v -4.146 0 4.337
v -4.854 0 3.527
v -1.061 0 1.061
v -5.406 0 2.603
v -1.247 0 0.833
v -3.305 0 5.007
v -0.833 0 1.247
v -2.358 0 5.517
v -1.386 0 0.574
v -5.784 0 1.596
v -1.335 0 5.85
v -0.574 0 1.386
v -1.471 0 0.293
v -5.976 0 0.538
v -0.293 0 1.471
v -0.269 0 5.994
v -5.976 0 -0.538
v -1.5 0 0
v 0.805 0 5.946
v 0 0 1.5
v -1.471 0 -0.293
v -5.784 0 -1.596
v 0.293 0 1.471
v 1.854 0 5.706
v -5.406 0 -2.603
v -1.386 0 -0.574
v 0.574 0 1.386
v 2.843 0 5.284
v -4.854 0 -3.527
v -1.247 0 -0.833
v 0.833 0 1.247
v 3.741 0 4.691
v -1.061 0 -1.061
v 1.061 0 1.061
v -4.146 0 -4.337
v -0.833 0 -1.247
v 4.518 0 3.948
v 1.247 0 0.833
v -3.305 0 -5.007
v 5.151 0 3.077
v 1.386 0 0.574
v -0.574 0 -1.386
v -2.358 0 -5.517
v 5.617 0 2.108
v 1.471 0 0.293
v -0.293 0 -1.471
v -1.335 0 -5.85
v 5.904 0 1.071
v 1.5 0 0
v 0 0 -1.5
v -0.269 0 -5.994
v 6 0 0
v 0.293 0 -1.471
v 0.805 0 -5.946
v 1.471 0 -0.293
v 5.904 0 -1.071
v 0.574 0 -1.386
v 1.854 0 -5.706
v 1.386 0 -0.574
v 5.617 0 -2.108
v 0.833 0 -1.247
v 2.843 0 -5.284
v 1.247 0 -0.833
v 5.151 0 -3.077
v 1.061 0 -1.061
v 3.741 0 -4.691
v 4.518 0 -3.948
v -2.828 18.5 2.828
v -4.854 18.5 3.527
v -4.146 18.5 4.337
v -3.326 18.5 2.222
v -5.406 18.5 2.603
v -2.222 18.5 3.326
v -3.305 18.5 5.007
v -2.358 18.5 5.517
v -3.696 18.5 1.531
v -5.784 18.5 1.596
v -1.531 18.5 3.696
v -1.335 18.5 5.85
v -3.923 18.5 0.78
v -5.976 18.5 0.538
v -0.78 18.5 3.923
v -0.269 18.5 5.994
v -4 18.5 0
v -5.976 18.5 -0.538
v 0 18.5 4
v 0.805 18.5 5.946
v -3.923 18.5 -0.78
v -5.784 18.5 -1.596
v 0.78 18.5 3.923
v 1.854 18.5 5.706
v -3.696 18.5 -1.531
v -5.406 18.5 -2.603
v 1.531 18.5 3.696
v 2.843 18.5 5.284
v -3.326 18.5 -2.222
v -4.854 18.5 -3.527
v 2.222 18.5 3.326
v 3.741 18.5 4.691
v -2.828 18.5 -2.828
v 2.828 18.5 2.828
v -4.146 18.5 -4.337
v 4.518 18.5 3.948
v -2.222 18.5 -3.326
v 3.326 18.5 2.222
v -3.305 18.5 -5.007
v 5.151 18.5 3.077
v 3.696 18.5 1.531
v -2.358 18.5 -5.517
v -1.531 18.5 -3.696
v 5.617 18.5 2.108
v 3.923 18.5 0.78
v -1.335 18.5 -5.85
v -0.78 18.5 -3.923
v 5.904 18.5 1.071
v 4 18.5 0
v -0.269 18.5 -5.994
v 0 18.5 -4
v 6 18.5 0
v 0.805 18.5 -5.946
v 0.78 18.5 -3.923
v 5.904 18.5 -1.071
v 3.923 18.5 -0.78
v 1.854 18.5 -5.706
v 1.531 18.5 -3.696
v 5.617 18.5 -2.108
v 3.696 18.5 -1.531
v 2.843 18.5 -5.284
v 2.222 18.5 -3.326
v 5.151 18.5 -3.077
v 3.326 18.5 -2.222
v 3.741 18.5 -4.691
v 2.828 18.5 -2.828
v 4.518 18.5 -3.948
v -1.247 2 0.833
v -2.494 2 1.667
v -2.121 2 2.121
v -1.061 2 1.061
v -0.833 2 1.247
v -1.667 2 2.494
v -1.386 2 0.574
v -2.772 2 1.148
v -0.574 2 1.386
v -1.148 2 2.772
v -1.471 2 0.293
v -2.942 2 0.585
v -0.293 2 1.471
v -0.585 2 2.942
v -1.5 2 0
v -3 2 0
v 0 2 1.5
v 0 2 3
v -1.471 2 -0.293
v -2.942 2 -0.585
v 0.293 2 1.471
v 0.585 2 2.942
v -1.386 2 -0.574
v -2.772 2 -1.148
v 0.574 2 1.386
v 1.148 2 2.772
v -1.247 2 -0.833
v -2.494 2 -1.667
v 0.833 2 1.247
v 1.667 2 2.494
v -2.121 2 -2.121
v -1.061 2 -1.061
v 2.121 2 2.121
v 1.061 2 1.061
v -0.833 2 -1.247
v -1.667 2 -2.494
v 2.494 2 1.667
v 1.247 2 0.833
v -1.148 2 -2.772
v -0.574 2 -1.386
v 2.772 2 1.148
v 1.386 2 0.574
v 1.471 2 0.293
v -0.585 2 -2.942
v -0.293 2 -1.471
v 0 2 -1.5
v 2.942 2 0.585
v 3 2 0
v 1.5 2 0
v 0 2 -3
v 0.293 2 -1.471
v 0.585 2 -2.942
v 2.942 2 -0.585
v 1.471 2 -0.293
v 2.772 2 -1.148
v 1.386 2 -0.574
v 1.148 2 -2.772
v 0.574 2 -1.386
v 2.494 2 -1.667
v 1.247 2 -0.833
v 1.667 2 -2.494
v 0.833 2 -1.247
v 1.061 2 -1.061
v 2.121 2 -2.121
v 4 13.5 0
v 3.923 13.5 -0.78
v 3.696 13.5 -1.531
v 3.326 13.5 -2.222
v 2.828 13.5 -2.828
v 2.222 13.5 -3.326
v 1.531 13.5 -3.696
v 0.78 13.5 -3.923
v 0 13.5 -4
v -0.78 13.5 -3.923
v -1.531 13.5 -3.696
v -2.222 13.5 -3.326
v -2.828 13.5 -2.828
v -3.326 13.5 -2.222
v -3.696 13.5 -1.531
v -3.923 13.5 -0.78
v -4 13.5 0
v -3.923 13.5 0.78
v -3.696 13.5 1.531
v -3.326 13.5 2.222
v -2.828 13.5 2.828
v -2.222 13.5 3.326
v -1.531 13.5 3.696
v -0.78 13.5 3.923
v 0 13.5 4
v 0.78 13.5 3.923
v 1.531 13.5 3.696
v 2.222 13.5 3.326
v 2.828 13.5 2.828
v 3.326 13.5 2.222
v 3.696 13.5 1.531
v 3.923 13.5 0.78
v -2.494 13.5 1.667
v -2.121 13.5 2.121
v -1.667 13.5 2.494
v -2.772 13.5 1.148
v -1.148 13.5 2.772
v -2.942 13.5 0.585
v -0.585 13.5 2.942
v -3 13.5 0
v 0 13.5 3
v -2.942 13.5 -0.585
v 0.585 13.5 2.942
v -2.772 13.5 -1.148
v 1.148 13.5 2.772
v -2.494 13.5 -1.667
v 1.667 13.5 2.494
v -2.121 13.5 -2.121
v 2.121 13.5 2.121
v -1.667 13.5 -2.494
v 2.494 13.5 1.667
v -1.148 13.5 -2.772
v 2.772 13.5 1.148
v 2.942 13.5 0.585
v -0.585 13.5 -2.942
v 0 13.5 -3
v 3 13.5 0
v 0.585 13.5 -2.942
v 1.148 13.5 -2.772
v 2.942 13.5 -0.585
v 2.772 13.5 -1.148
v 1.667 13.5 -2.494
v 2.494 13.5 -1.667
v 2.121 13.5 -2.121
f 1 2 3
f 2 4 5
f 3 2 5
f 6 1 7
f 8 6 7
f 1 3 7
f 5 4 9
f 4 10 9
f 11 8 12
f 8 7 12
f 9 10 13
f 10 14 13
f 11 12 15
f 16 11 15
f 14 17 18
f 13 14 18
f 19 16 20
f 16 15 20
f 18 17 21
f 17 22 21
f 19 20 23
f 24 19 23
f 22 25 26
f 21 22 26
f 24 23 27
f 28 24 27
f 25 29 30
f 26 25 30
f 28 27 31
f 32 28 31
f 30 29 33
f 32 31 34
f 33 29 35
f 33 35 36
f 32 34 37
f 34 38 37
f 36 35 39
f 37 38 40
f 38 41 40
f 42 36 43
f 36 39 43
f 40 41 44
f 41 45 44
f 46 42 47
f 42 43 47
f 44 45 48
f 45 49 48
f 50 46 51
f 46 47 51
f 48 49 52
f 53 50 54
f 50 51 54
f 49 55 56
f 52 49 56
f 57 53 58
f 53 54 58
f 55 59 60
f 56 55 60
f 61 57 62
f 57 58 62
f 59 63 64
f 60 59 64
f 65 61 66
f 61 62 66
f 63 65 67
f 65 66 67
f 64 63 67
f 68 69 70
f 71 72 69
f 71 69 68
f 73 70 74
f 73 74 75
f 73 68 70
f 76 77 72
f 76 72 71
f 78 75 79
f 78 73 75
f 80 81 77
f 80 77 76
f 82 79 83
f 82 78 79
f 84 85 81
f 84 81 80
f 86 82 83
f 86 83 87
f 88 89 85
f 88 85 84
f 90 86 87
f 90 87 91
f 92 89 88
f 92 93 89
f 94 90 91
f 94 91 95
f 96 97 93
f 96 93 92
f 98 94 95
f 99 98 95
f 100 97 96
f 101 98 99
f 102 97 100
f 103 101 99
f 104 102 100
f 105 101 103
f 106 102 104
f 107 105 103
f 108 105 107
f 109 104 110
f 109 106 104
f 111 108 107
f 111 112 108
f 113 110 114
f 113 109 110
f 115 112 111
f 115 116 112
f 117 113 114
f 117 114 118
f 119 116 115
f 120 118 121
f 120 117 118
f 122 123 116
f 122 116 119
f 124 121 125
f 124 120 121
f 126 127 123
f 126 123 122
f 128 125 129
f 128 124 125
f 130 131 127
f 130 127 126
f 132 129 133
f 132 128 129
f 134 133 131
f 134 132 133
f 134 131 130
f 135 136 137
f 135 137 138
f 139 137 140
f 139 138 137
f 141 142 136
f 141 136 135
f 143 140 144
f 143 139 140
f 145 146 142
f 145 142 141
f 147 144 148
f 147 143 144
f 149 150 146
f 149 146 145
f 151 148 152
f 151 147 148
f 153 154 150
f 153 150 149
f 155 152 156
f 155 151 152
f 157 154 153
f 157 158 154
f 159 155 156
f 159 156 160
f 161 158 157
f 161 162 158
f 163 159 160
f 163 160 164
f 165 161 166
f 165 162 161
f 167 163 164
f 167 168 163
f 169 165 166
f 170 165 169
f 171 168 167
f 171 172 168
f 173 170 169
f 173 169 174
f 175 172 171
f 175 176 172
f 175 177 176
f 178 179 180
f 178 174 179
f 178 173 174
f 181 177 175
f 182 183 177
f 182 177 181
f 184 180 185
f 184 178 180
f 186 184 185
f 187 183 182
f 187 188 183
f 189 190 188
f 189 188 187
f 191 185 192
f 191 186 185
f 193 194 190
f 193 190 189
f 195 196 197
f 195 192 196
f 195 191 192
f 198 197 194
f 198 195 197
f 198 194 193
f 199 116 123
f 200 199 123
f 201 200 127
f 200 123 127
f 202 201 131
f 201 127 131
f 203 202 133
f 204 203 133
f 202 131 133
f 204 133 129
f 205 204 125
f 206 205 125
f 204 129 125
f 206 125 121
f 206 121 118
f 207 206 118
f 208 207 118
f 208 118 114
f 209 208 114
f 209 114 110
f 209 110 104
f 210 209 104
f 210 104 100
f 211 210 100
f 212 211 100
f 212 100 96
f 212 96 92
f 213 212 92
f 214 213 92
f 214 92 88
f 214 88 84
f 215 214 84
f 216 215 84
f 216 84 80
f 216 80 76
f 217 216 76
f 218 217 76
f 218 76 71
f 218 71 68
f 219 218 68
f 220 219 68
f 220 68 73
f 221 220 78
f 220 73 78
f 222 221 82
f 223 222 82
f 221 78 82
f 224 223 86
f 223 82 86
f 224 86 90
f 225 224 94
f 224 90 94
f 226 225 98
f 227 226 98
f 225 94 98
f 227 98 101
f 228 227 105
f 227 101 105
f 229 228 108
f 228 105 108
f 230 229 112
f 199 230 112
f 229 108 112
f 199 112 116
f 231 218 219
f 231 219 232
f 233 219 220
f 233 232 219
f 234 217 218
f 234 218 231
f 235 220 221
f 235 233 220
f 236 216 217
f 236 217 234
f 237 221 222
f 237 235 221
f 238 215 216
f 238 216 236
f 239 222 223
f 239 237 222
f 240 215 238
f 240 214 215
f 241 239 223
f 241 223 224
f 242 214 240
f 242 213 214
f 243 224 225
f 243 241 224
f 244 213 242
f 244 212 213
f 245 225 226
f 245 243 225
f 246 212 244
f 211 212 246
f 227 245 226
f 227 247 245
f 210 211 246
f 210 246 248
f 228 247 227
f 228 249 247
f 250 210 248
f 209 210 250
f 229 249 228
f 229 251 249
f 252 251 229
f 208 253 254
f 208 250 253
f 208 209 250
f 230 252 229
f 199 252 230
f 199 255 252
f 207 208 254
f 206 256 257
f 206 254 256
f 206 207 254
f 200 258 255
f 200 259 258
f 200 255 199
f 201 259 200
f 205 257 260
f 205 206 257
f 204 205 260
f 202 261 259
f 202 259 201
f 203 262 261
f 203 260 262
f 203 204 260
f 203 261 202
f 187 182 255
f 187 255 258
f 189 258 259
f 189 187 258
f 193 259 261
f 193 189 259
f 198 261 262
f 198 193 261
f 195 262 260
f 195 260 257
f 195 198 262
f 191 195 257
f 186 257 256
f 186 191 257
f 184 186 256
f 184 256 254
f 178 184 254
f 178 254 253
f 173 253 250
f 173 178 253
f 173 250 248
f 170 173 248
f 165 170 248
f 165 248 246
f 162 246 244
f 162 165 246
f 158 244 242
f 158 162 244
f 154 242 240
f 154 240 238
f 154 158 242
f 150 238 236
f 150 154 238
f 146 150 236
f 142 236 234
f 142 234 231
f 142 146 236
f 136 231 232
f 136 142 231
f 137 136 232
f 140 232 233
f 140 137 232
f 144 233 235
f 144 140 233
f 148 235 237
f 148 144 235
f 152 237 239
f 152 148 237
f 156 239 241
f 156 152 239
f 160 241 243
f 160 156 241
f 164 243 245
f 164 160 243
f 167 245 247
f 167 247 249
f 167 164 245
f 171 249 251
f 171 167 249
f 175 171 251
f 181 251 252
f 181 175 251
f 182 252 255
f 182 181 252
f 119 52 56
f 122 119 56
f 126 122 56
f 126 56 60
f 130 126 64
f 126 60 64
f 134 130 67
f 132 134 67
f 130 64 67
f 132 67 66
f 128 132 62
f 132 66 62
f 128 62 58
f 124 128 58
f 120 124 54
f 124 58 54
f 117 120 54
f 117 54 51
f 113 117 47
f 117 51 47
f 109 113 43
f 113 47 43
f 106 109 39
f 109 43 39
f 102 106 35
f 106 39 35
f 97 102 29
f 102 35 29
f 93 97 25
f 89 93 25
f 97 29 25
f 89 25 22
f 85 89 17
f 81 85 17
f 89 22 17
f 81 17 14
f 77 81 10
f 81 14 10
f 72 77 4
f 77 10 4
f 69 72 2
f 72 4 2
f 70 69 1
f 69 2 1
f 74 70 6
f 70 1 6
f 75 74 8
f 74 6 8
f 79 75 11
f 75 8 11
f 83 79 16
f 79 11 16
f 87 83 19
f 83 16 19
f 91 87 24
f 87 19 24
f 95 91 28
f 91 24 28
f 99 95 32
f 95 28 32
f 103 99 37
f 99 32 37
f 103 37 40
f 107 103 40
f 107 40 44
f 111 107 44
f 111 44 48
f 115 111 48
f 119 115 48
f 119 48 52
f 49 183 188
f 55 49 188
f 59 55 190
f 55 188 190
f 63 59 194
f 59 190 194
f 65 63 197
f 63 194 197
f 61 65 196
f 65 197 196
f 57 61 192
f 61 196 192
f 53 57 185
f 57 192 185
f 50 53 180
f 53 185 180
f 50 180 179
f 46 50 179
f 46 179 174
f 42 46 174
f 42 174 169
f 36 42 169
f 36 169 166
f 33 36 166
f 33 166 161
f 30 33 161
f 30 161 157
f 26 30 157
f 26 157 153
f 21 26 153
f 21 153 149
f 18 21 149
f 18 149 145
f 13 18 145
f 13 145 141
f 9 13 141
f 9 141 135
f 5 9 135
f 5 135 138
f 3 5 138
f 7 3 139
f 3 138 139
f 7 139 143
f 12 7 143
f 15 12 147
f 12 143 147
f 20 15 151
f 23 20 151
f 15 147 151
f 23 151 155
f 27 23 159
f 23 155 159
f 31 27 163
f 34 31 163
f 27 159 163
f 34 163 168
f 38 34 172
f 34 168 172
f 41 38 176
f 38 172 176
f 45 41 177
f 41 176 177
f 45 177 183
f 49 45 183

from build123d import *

# Parameters (mm, degrees)
SKETCH2_R           = 6
BOSS_EXTRUDE2_DEPTH = 18.5
SKETCH3_R           = 4
CUT_EXTRUDE1_DEPTH  = 16.5
CUT_EXTRUDE2_REACH  = 4
SKETCH4_R           = 1.5
SKETCH5_R           = 4
SKETCH5_R_2         = 3
BOSS_EXTRUDE3_DEPTH = 11.5


with BuildPart() as part:
    # Sketch2 → Boss-Extrude2 (new body)
    with BuildSketch(Plane(origin=(0, 0, 0), x_dir=(1, 0, 0), z_dir=(0, 1, 0))):
        Circle(SKETCH2_R)
    extrude(amount=BOSS_EXTRUDE2_DEPTH)

    # Sketch3 → Cut-Extrude1 (cut)
    with BuildSketch(Plane(origin=(0, 18.5, 0), x_dir=(1, 0, 0), z_dir=(0, 1, 0))):
        Circle(SKETCH3_R)
    extrude(amount=-CUT_EXTRUDE1_DEPTH, mode=Mode.SUBTRACT)

    # Sketch4 → Cut-Extrude2 (cut, up to next)
    with BuildSketch(Plane(origin=(0, 2, 0), x_dir=(1, 0, 0), z_dir=(0, 1, 0)), mode=Mode.PRIVATE) as cut_extrude2_sk1:
        Circle(SKETCH4_R)
    cut_extrude2_tool1 = extrude(cut_extrude2_sk1.sketch, amount=-CUT_EXTRUDE2_REACH, mode=Mode.PRIVATE) & part.part
    add(cut_extrude2_tool1.solids().sort_by_distance((0, 2, 0))[0], mode=Mode.SUBTRACT)

    # Sketch5 → Boss-Extrude3 (add)
    with BuildSketch(Plane(origin=(0, 2, 0), x_dir=(1, 0, 0), z_dir=(0, 1, 0))):
        Circle(SKETCH5_R)
        Circle(SKETCH5_R_2, mode=Mode.SUBTRACT)
    extrude(amount=BOSS_EXTRUDE3_DEPTH)


solid = part.part
